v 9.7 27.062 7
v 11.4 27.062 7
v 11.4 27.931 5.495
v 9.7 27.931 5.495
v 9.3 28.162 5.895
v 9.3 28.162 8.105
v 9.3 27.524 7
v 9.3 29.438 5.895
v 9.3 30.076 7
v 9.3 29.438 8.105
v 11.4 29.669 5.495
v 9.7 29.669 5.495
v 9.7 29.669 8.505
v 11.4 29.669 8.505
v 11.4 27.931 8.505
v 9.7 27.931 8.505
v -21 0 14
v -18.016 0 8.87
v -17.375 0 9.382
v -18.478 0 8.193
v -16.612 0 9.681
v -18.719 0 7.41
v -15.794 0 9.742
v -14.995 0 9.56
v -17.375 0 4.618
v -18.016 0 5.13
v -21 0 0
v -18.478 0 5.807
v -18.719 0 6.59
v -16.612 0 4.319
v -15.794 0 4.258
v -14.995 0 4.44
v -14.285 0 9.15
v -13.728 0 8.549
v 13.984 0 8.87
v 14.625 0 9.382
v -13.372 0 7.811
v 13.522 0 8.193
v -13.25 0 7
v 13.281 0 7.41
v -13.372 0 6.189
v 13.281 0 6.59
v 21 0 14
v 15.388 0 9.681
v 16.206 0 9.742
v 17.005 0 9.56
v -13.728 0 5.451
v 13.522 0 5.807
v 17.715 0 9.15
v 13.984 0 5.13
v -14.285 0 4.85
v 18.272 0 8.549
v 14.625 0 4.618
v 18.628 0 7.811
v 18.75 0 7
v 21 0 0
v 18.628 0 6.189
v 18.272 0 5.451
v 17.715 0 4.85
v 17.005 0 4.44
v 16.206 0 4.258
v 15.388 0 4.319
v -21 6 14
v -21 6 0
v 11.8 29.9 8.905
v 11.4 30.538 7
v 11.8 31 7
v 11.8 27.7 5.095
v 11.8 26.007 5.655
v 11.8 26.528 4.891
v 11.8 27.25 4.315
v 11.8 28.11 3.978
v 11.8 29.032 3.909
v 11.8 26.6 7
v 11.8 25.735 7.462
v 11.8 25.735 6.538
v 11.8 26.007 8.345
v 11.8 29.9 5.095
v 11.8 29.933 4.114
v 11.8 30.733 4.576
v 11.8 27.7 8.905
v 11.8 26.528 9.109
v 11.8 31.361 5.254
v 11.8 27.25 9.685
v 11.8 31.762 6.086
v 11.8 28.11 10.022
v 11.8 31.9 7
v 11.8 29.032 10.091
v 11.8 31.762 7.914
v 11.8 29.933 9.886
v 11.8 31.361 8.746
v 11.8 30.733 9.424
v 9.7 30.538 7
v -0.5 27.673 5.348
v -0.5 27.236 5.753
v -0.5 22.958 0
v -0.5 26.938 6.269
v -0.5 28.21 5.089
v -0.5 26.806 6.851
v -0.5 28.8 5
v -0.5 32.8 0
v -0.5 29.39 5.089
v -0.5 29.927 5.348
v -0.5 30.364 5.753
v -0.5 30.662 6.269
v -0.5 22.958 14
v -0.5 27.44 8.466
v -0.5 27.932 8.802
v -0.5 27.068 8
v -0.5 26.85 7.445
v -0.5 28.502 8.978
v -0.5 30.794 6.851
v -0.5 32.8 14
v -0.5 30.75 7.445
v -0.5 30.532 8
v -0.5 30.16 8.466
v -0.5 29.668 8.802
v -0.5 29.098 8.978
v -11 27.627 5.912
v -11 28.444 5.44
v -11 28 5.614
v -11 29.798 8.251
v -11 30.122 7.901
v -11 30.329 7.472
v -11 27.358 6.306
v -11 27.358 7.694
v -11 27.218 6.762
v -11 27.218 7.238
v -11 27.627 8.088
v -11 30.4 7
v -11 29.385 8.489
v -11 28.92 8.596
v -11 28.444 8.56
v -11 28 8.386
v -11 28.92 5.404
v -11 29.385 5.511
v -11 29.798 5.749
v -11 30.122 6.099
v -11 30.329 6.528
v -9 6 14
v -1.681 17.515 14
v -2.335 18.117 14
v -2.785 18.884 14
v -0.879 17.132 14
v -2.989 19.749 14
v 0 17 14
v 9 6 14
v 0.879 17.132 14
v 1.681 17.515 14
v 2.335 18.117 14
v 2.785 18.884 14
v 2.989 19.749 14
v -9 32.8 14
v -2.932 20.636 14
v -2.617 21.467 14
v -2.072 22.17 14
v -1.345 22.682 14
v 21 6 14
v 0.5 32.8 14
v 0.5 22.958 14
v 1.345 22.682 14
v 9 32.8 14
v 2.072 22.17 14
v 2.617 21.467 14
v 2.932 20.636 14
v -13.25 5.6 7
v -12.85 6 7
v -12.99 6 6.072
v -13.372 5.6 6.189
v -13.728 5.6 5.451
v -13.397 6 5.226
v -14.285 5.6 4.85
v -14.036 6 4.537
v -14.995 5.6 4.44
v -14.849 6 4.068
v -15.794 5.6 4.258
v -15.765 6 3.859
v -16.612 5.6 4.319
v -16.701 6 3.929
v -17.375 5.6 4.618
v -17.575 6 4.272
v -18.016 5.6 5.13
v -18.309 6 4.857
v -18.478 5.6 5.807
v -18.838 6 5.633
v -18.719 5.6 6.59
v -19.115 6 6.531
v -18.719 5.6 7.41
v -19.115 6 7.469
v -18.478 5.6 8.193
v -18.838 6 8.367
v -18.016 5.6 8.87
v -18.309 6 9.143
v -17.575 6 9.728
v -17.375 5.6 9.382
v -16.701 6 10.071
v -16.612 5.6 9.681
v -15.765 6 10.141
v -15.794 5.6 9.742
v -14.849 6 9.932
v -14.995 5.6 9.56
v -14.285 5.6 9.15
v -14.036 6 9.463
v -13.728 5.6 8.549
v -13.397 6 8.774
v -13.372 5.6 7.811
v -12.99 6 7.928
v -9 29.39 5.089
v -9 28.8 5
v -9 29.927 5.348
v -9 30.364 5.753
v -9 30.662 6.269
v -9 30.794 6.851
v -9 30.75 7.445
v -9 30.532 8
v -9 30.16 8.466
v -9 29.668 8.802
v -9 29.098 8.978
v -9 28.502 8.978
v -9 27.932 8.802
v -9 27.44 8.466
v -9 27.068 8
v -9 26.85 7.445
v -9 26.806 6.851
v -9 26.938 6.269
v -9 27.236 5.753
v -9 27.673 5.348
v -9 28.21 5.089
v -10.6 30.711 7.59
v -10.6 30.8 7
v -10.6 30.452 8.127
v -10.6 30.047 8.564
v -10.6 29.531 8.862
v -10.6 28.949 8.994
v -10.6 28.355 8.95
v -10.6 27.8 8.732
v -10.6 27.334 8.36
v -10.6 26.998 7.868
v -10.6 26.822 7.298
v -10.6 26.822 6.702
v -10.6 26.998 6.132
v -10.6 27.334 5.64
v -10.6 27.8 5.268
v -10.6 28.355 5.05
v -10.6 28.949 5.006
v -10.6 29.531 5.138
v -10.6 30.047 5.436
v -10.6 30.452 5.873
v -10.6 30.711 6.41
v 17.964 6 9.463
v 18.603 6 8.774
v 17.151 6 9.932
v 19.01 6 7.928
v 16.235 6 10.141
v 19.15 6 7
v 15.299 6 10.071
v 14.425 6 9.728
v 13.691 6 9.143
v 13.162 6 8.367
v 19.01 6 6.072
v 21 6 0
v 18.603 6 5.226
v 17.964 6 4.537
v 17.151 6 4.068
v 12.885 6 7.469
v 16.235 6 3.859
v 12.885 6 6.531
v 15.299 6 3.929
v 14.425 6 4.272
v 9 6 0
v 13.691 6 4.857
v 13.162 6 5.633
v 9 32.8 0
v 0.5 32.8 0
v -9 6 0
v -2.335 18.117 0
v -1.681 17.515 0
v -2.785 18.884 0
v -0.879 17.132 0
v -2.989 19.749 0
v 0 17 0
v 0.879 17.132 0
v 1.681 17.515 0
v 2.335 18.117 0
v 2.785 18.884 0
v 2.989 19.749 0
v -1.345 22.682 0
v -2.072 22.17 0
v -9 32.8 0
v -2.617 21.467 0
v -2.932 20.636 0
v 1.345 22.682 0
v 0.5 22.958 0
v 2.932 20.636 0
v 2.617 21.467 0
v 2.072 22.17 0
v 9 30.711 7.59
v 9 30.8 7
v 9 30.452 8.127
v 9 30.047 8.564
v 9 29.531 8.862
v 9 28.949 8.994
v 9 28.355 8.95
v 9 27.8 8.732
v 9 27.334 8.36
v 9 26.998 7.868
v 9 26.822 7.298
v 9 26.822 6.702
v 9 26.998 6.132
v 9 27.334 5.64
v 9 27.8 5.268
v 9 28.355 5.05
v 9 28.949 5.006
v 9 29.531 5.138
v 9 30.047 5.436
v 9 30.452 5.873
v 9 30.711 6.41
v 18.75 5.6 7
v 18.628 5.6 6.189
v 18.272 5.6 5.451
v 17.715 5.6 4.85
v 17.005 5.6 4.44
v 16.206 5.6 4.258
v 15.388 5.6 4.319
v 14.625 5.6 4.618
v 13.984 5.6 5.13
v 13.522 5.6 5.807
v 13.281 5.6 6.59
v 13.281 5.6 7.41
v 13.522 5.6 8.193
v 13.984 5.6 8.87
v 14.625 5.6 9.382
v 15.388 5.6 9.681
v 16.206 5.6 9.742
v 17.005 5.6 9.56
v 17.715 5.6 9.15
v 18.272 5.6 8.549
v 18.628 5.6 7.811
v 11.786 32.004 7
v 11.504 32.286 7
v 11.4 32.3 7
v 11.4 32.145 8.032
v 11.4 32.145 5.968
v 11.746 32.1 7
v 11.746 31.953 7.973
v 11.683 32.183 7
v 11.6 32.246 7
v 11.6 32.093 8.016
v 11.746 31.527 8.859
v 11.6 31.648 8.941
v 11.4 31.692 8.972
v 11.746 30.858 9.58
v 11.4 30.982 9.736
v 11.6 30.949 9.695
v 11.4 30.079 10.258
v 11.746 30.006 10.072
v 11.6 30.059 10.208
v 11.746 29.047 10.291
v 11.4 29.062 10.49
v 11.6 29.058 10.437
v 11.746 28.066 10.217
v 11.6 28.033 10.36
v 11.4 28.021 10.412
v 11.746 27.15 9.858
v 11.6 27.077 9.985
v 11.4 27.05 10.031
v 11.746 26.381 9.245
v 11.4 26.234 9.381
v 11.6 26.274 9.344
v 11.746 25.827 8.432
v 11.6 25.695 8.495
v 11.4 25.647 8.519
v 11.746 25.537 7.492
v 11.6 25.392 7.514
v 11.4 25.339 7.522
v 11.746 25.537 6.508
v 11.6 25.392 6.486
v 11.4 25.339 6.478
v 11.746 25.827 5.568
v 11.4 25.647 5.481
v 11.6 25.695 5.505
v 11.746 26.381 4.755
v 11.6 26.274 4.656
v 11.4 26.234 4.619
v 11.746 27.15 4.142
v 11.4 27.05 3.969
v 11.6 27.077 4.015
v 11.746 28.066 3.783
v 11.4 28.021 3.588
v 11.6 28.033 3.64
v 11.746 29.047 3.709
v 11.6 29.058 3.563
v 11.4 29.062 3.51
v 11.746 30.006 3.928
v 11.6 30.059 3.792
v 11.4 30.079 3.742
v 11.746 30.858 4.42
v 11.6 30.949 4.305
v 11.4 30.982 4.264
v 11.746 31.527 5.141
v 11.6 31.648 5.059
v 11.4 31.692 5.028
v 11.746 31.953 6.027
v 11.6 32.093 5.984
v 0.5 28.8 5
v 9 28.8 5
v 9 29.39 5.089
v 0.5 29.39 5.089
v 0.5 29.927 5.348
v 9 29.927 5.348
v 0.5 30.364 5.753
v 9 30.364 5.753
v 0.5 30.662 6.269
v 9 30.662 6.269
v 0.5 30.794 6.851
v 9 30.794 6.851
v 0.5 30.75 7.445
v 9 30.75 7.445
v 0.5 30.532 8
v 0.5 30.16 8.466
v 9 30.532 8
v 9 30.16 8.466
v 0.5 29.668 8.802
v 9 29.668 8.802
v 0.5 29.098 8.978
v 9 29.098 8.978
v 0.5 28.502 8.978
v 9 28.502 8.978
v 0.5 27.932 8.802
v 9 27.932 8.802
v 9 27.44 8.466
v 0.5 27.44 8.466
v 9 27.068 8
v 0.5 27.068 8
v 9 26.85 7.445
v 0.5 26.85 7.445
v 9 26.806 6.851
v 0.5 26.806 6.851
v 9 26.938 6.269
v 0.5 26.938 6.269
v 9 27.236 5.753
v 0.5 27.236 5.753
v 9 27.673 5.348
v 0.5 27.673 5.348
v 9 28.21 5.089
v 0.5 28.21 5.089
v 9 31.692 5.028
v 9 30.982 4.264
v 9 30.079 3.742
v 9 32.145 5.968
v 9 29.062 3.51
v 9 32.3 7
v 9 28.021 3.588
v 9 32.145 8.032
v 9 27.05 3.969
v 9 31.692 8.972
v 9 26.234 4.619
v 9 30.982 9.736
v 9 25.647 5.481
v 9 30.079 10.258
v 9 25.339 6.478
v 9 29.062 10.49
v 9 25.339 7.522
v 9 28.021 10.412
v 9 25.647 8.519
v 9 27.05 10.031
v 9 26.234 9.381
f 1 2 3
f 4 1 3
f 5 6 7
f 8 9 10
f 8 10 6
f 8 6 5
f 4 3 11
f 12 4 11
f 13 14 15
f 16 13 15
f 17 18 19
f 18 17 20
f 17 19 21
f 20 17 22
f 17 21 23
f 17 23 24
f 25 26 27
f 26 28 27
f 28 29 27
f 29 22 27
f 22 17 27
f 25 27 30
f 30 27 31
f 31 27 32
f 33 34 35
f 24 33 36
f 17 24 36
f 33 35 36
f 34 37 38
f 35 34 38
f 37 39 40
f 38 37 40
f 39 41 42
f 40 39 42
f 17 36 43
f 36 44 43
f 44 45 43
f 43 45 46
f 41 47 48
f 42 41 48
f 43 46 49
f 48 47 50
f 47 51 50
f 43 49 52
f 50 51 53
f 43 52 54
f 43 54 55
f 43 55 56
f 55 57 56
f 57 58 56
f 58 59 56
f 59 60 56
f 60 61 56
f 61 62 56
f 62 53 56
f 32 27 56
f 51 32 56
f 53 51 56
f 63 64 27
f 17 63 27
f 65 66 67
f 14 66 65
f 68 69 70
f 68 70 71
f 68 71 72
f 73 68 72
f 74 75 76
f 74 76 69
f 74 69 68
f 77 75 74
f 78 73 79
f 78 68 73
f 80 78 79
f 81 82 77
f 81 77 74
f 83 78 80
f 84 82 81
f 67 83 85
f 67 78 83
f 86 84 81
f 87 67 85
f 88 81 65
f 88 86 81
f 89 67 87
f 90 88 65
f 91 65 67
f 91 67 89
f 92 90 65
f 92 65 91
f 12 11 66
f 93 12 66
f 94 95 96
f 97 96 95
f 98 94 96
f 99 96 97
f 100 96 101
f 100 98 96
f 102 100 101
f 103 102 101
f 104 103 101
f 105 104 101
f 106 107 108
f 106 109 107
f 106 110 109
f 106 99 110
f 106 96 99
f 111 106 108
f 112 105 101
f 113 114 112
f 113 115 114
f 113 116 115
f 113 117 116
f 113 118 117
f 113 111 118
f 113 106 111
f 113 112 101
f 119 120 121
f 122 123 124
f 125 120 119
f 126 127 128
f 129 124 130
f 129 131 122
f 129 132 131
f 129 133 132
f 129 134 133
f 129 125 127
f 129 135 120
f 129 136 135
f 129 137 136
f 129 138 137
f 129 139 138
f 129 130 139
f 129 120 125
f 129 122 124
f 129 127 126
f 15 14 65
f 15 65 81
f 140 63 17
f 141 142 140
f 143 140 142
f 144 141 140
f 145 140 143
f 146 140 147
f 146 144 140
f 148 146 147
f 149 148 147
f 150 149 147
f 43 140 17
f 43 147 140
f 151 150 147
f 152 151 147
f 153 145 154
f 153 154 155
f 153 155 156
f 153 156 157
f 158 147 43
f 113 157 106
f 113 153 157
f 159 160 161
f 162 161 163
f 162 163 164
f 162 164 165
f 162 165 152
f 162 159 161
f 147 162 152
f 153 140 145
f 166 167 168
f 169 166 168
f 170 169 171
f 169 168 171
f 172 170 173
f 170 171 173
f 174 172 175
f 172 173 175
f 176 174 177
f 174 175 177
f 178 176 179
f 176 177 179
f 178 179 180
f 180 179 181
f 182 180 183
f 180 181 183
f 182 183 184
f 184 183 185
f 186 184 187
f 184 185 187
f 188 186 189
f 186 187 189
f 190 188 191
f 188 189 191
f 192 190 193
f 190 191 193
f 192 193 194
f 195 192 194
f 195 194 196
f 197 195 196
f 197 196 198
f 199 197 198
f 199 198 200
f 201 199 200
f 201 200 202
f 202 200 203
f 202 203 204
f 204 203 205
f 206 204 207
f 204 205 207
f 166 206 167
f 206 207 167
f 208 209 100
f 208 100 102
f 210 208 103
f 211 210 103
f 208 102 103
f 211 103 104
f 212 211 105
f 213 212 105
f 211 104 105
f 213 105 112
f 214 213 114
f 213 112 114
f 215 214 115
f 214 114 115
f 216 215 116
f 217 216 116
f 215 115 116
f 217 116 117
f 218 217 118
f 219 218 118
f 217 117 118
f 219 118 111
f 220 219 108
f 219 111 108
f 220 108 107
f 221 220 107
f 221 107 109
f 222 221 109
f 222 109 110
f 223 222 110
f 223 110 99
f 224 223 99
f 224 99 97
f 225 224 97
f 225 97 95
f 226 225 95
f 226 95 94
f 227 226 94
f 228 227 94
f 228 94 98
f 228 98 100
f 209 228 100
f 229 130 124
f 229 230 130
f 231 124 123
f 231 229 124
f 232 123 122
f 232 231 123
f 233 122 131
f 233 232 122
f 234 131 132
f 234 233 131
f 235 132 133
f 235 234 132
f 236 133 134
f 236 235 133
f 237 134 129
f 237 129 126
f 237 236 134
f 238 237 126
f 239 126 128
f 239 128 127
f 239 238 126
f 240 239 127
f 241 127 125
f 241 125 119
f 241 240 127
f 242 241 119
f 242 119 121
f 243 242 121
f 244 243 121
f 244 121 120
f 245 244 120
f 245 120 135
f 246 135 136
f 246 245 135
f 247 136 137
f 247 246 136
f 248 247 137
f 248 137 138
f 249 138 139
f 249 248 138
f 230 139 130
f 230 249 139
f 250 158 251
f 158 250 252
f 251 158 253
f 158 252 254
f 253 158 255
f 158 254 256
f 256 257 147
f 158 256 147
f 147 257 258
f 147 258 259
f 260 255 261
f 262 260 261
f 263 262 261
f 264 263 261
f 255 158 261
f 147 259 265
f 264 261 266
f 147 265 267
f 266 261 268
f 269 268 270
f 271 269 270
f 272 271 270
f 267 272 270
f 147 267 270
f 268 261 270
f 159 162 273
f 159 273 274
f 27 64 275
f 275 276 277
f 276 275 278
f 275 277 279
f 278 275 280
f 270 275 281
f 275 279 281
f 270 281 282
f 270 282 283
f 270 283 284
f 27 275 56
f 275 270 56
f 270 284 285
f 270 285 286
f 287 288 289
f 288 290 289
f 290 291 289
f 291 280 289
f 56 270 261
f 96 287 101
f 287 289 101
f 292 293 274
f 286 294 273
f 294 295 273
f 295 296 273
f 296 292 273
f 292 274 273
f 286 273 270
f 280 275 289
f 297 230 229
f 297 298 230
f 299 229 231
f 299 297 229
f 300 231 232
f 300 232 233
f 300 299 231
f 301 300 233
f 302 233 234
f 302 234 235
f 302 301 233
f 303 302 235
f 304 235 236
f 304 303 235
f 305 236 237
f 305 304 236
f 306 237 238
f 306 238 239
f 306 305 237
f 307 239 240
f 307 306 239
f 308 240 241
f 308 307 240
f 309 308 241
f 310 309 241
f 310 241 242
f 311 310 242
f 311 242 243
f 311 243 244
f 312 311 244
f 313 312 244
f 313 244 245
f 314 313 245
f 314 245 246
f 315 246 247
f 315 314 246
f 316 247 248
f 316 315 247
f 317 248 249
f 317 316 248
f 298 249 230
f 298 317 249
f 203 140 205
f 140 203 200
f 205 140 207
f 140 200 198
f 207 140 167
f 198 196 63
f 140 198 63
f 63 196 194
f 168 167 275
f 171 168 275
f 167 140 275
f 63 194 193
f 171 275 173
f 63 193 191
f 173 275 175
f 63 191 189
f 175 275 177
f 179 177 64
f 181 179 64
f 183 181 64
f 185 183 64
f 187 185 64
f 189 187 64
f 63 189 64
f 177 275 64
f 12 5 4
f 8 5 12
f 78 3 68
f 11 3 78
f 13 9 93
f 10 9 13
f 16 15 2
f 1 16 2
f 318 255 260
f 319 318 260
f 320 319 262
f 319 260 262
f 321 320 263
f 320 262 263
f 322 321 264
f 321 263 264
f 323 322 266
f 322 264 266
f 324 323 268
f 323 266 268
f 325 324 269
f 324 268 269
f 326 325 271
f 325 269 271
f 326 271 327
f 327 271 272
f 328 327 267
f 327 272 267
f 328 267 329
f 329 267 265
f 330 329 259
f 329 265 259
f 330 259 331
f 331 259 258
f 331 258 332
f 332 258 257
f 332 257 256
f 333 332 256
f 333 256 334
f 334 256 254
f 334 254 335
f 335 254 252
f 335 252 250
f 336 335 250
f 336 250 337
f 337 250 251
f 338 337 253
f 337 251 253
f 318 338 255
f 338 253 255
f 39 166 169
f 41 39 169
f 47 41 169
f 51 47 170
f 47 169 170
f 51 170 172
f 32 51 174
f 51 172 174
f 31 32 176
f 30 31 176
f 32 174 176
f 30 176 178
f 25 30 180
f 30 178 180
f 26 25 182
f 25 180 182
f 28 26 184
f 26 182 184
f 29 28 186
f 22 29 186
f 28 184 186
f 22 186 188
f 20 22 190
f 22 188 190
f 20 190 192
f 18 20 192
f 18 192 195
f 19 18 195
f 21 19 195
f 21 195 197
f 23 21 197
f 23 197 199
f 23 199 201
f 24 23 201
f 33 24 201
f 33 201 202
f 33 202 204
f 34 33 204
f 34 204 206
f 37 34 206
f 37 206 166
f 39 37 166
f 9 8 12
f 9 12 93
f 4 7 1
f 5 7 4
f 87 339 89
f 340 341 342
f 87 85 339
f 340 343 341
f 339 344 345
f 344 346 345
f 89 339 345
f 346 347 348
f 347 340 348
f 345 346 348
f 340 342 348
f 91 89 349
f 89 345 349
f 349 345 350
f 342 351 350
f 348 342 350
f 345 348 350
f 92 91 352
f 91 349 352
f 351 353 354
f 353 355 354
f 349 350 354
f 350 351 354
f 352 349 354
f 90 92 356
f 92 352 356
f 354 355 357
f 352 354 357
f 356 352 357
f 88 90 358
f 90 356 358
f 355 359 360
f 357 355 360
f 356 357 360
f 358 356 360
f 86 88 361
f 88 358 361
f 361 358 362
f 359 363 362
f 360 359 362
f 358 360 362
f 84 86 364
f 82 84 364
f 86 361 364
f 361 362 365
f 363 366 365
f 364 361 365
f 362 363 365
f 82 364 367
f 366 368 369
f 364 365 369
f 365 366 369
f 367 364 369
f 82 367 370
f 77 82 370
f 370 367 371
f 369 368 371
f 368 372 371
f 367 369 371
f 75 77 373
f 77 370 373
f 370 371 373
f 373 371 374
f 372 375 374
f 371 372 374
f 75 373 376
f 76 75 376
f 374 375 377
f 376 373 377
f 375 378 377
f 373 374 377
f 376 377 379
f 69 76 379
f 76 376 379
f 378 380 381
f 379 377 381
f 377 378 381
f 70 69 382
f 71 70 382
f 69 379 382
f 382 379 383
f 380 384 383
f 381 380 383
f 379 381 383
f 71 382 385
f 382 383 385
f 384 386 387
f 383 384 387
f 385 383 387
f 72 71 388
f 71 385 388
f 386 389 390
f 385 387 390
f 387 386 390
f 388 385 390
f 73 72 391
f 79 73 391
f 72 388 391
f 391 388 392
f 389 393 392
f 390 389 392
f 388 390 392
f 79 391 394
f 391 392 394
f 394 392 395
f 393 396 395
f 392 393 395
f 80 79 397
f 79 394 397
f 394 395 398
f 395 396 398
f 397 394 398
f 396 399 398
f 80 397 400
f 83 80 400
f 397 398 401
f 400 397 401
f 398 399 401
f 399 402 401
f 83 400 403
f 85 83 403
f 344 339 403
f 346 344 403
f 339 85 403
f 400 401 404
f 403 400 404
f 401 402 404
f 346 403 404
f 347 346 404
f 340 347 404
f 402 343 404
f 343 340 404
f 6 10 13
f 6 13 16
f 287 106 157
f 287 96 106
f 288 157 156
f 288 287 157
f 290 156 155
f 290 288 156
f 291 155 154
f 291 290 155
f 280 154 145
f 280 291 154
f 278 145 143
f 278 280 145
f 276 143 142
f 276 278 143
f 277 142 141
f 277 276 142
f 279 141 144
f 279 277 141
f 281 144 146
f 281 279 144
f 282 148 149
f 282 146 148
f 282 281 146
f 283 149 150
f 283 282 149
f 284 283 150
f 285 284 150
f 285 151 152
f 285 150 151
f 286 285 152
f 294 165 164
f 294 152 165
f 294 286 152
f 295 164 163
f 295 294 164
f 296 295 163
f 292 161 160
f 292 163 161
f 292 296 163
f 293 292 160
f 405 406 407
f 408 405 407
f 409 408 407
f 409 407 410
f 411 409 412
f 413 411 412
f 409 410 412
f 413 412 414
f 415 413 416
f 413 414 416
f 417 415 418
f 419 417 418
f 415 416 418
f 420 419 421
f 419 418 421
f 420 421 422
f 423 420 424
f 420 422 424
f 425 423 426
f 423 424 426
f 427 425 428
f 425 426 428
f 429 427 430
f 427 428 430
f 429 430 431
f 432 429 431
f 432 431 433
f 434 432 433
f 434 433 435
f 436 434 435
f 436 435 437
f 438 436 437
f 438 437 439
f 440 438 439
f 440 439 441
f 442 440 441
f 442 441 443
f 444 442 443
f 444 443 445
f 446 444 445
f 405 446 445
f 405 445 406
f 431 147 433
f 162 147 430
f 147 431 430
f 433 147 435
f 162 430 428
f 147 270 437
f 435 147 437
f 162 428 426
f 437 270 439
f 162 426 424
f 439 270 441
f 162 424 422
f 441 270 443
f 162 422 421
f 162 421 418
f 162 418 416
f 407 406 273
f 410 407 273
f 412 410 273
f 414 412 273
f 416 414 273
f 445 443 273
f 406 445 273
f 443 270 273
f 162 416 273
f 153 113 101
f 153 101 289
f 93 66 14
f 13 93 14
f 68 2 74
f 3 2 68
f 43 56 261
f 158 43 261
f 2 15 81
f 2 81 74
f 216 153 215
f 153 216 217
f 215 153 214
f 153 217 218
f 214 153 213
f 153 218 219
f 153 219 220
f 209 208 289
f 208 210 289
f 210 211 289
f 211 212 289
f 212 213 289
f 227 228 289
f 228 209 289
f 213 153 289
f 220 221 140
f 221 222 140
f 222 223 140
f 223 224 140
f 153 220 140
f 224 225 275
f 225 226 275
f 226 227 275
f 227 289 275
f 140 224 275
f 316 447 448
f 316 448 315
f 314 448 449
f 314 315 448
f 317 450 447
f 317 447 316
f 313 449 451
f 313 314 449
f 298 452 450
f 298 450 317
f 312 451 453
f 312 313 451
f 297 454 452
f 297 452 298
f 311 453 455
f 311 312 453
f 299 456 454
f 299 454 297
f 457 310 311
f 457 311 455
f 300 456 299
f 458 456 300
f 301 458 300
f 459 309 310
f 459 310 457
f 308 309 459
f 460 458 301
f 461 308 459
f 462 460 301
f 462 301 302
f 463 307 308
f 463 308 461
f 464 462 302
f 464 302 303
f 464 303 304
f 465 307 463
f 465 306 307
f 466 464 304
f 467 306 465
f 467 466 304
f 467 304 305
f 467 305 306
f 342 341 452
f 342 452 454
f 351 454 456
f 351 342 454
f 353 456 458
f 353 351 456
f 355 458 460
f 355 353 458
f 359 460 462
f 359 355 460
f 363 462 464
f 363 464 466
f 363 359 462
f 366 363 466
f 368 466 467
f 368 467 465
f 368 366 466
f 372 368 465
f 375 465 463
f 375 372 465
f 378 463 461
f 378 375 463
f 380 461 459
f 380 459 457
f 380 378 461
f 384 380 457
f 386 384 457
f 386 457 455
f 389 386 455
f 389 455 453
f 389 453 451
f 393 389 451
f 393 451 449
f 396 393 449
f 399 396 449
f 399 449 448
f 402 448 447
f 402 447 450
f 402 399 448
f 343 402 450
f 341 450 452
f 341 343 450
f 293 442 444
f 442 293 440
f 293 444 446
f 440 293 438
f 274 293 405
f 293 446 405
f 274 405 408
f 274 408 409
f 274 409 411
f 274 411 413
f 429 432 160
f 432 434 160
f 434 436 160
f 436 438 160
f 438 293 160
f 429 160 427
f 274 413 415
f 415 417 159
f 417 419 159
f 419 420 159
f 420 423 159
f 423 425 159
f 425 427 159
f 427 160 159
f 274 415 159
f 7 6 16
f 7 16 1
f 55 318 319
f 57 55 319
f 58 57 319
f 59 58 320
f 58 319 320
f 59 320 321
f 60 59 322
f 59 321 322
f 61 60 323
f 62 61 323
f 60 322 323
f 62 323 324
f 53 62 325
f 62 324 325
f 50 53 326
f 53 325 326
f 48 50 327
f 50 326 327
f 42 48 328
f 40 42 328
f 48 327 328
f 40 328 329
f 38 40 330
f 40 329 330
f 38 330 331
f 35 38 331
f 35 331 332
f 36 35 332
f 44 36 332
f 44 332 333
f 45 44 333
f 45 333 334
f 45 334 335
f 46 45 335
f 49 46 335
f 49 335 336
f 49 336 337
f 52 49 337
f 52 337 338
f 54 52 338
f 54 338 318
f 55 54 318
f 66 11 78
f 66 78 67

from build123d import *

# Parameters (mm, degrees)
SKETCH1_R                = 3
BOSS_EXTRUDE1_DEPTH      = 14
SKETCH3_W                = 1
SKETCH3_H                = 11.790173319
CUT_EXTRUDE1_DEPTH       = 19
SKETCH2_R                = 2
CUT_EXTRUDE3_DEPTH       = 31
SKETCH5_R                = 2.75
CUT_EXTRUDE5_DEPTH       = 22
TAGLIO_ESTRUSIONE1_DEPTH = 2.5
SMUSSO1_SIZE             = 0.4
RACCORDO1_R              = 0.4
SMUSSO2_SIZE             = 0.4


with BuildPart() as part:
    # Sketch1 → Boss-Extrude1 (new body)
    with BuildSketch(Plane.XY):
        Polygon((-21, 0), (21, 0), (21, 6), (9, 6), (9, 32.8), (-9, 32.8), (-9, 6), (-21, 6), align=None)
        with Locations((0, 20)):
            Circle(SKETCH1_R, mode=Mode.SUBTRACT)
    extrude(amount=BOSS_EXTRUDE1_DEPTH)

    # Sketch3 → Cut-Extrude1 (cut)
    with BuildSketch(Plane.XY.offset(14)):
        with Locations((0, 26.904913341)):
            Rectangle(SKETCH3_W, SKETCH3_H)
    extrude(amount=-CUT_EXTRUDE1_DEPTH, mode=Mode.SUBTRACT)

    # Sketch2 → Cut-Extrude3 (cut)
    with BuildSketch(Plane(origin=(9, 0, 0), x_dir=(0, 0, -1), z_dir=(1, 0, 0))):
        with Locations((-7, 28.8)):
            Circle(SKETCH2_R)
    extrude(amount=-CUT_EXTRUDE3_DEPTH, mode=Mode.SUBTRACT)

    # Sketch5 → Cut-Extrude5 (cut)
    with BuildSketch(Plane(origin=(0, 6, 0), x_dir=(1, 0, 0), z_dir=(0, 1, 0))):
        with Locations((16, -7)):
            Circle(SKETCH5_R)
        with Locations((-16, -7)):
            Circle(SKETCH5_R)
    extrude(amount=-CUT_EXTRUDE5_DEPTH, mode=Mode.SUBTRACT)

    # Smusso2
    smusso2_edges = [part.edges().sort_by_distance(p)[0] for p in [
        (13.25, 6, 7),
        (-18.75, 6, 7),
    ]]
    chamfer(smusso2_edges, length=SMUSSO2_SIZE)


with BuildPart() as body_2:
    # Schizzo1 → Rivoluzione1 (revolve)
    with BuildSketch(Plane.XY.offset(7)):
        Polygon((11.8, 28.8), (-11, 28.8), (-11, 30.4), (-10.6, 30.8), (9, 30.8), (9, 32.3), (11.8, 32.3), align=None)
    revolve(axis=Axis((-22.704724307, 28.8, 7), (1, 0, 0)))

    # Schizzo2 → Taglio-Estrusione1 (cut)
    with BuildSketch(Plane(origin=(11.8, 0, 0), x_dir=(0, 0, -1), z_dir=(1, 0, 0))):
        Polygon((-7, 30.538280632), (-8.505395186, 29.669140316), (-8.505395186, 27.930859684), (-7, 27.061719368), (-5.494604814, 27.930859684), (-5.494604814, 29.669140316), align=None)
    extrude(amount=-TAGLIO_ESTRUSIONE1_DEPTH, mode=Mode.SUBTRACT)

    # Smusso1
    smusso1_edges = [body_2.edges().sort_by_distance(p)[0] for p in [
        (9.3, 30.103710474, 6.247302407),
        (9.3, 28.8, 5.494604814),
        (9.3, 27.496289526, 6.247302407),
        (9.3, 27.496289526, 7.752697593),
        (9.3, 28.8, 8.505395186),
        (9.3, 30.103710474, 7.752697593),
        (11.8, 30.103710474, 6.247302407),
        (11.8, 30.103710474, 7.752697593),
        (11.8, 28.8, 8.505395186),
        (11.8, 27.496289526, 7.752697593),
        (11.8, 27.496289526, 6.247302407),
        (11.8, 28.8, 5.494604814),
    ]]
    chamfer(smusso1_edges, length=SMUSSO1_SIZE)

    # Raccordo1
    raccordo1_edges = [body_2.edges().sort_by_distance(p)[0] for p in [
        (11.8, 25.3, 7),
    ]]
    fillet(raccordo1_edges, radius=RACCORDO1_R)


solid = Compound([part.part, body_2.part])
